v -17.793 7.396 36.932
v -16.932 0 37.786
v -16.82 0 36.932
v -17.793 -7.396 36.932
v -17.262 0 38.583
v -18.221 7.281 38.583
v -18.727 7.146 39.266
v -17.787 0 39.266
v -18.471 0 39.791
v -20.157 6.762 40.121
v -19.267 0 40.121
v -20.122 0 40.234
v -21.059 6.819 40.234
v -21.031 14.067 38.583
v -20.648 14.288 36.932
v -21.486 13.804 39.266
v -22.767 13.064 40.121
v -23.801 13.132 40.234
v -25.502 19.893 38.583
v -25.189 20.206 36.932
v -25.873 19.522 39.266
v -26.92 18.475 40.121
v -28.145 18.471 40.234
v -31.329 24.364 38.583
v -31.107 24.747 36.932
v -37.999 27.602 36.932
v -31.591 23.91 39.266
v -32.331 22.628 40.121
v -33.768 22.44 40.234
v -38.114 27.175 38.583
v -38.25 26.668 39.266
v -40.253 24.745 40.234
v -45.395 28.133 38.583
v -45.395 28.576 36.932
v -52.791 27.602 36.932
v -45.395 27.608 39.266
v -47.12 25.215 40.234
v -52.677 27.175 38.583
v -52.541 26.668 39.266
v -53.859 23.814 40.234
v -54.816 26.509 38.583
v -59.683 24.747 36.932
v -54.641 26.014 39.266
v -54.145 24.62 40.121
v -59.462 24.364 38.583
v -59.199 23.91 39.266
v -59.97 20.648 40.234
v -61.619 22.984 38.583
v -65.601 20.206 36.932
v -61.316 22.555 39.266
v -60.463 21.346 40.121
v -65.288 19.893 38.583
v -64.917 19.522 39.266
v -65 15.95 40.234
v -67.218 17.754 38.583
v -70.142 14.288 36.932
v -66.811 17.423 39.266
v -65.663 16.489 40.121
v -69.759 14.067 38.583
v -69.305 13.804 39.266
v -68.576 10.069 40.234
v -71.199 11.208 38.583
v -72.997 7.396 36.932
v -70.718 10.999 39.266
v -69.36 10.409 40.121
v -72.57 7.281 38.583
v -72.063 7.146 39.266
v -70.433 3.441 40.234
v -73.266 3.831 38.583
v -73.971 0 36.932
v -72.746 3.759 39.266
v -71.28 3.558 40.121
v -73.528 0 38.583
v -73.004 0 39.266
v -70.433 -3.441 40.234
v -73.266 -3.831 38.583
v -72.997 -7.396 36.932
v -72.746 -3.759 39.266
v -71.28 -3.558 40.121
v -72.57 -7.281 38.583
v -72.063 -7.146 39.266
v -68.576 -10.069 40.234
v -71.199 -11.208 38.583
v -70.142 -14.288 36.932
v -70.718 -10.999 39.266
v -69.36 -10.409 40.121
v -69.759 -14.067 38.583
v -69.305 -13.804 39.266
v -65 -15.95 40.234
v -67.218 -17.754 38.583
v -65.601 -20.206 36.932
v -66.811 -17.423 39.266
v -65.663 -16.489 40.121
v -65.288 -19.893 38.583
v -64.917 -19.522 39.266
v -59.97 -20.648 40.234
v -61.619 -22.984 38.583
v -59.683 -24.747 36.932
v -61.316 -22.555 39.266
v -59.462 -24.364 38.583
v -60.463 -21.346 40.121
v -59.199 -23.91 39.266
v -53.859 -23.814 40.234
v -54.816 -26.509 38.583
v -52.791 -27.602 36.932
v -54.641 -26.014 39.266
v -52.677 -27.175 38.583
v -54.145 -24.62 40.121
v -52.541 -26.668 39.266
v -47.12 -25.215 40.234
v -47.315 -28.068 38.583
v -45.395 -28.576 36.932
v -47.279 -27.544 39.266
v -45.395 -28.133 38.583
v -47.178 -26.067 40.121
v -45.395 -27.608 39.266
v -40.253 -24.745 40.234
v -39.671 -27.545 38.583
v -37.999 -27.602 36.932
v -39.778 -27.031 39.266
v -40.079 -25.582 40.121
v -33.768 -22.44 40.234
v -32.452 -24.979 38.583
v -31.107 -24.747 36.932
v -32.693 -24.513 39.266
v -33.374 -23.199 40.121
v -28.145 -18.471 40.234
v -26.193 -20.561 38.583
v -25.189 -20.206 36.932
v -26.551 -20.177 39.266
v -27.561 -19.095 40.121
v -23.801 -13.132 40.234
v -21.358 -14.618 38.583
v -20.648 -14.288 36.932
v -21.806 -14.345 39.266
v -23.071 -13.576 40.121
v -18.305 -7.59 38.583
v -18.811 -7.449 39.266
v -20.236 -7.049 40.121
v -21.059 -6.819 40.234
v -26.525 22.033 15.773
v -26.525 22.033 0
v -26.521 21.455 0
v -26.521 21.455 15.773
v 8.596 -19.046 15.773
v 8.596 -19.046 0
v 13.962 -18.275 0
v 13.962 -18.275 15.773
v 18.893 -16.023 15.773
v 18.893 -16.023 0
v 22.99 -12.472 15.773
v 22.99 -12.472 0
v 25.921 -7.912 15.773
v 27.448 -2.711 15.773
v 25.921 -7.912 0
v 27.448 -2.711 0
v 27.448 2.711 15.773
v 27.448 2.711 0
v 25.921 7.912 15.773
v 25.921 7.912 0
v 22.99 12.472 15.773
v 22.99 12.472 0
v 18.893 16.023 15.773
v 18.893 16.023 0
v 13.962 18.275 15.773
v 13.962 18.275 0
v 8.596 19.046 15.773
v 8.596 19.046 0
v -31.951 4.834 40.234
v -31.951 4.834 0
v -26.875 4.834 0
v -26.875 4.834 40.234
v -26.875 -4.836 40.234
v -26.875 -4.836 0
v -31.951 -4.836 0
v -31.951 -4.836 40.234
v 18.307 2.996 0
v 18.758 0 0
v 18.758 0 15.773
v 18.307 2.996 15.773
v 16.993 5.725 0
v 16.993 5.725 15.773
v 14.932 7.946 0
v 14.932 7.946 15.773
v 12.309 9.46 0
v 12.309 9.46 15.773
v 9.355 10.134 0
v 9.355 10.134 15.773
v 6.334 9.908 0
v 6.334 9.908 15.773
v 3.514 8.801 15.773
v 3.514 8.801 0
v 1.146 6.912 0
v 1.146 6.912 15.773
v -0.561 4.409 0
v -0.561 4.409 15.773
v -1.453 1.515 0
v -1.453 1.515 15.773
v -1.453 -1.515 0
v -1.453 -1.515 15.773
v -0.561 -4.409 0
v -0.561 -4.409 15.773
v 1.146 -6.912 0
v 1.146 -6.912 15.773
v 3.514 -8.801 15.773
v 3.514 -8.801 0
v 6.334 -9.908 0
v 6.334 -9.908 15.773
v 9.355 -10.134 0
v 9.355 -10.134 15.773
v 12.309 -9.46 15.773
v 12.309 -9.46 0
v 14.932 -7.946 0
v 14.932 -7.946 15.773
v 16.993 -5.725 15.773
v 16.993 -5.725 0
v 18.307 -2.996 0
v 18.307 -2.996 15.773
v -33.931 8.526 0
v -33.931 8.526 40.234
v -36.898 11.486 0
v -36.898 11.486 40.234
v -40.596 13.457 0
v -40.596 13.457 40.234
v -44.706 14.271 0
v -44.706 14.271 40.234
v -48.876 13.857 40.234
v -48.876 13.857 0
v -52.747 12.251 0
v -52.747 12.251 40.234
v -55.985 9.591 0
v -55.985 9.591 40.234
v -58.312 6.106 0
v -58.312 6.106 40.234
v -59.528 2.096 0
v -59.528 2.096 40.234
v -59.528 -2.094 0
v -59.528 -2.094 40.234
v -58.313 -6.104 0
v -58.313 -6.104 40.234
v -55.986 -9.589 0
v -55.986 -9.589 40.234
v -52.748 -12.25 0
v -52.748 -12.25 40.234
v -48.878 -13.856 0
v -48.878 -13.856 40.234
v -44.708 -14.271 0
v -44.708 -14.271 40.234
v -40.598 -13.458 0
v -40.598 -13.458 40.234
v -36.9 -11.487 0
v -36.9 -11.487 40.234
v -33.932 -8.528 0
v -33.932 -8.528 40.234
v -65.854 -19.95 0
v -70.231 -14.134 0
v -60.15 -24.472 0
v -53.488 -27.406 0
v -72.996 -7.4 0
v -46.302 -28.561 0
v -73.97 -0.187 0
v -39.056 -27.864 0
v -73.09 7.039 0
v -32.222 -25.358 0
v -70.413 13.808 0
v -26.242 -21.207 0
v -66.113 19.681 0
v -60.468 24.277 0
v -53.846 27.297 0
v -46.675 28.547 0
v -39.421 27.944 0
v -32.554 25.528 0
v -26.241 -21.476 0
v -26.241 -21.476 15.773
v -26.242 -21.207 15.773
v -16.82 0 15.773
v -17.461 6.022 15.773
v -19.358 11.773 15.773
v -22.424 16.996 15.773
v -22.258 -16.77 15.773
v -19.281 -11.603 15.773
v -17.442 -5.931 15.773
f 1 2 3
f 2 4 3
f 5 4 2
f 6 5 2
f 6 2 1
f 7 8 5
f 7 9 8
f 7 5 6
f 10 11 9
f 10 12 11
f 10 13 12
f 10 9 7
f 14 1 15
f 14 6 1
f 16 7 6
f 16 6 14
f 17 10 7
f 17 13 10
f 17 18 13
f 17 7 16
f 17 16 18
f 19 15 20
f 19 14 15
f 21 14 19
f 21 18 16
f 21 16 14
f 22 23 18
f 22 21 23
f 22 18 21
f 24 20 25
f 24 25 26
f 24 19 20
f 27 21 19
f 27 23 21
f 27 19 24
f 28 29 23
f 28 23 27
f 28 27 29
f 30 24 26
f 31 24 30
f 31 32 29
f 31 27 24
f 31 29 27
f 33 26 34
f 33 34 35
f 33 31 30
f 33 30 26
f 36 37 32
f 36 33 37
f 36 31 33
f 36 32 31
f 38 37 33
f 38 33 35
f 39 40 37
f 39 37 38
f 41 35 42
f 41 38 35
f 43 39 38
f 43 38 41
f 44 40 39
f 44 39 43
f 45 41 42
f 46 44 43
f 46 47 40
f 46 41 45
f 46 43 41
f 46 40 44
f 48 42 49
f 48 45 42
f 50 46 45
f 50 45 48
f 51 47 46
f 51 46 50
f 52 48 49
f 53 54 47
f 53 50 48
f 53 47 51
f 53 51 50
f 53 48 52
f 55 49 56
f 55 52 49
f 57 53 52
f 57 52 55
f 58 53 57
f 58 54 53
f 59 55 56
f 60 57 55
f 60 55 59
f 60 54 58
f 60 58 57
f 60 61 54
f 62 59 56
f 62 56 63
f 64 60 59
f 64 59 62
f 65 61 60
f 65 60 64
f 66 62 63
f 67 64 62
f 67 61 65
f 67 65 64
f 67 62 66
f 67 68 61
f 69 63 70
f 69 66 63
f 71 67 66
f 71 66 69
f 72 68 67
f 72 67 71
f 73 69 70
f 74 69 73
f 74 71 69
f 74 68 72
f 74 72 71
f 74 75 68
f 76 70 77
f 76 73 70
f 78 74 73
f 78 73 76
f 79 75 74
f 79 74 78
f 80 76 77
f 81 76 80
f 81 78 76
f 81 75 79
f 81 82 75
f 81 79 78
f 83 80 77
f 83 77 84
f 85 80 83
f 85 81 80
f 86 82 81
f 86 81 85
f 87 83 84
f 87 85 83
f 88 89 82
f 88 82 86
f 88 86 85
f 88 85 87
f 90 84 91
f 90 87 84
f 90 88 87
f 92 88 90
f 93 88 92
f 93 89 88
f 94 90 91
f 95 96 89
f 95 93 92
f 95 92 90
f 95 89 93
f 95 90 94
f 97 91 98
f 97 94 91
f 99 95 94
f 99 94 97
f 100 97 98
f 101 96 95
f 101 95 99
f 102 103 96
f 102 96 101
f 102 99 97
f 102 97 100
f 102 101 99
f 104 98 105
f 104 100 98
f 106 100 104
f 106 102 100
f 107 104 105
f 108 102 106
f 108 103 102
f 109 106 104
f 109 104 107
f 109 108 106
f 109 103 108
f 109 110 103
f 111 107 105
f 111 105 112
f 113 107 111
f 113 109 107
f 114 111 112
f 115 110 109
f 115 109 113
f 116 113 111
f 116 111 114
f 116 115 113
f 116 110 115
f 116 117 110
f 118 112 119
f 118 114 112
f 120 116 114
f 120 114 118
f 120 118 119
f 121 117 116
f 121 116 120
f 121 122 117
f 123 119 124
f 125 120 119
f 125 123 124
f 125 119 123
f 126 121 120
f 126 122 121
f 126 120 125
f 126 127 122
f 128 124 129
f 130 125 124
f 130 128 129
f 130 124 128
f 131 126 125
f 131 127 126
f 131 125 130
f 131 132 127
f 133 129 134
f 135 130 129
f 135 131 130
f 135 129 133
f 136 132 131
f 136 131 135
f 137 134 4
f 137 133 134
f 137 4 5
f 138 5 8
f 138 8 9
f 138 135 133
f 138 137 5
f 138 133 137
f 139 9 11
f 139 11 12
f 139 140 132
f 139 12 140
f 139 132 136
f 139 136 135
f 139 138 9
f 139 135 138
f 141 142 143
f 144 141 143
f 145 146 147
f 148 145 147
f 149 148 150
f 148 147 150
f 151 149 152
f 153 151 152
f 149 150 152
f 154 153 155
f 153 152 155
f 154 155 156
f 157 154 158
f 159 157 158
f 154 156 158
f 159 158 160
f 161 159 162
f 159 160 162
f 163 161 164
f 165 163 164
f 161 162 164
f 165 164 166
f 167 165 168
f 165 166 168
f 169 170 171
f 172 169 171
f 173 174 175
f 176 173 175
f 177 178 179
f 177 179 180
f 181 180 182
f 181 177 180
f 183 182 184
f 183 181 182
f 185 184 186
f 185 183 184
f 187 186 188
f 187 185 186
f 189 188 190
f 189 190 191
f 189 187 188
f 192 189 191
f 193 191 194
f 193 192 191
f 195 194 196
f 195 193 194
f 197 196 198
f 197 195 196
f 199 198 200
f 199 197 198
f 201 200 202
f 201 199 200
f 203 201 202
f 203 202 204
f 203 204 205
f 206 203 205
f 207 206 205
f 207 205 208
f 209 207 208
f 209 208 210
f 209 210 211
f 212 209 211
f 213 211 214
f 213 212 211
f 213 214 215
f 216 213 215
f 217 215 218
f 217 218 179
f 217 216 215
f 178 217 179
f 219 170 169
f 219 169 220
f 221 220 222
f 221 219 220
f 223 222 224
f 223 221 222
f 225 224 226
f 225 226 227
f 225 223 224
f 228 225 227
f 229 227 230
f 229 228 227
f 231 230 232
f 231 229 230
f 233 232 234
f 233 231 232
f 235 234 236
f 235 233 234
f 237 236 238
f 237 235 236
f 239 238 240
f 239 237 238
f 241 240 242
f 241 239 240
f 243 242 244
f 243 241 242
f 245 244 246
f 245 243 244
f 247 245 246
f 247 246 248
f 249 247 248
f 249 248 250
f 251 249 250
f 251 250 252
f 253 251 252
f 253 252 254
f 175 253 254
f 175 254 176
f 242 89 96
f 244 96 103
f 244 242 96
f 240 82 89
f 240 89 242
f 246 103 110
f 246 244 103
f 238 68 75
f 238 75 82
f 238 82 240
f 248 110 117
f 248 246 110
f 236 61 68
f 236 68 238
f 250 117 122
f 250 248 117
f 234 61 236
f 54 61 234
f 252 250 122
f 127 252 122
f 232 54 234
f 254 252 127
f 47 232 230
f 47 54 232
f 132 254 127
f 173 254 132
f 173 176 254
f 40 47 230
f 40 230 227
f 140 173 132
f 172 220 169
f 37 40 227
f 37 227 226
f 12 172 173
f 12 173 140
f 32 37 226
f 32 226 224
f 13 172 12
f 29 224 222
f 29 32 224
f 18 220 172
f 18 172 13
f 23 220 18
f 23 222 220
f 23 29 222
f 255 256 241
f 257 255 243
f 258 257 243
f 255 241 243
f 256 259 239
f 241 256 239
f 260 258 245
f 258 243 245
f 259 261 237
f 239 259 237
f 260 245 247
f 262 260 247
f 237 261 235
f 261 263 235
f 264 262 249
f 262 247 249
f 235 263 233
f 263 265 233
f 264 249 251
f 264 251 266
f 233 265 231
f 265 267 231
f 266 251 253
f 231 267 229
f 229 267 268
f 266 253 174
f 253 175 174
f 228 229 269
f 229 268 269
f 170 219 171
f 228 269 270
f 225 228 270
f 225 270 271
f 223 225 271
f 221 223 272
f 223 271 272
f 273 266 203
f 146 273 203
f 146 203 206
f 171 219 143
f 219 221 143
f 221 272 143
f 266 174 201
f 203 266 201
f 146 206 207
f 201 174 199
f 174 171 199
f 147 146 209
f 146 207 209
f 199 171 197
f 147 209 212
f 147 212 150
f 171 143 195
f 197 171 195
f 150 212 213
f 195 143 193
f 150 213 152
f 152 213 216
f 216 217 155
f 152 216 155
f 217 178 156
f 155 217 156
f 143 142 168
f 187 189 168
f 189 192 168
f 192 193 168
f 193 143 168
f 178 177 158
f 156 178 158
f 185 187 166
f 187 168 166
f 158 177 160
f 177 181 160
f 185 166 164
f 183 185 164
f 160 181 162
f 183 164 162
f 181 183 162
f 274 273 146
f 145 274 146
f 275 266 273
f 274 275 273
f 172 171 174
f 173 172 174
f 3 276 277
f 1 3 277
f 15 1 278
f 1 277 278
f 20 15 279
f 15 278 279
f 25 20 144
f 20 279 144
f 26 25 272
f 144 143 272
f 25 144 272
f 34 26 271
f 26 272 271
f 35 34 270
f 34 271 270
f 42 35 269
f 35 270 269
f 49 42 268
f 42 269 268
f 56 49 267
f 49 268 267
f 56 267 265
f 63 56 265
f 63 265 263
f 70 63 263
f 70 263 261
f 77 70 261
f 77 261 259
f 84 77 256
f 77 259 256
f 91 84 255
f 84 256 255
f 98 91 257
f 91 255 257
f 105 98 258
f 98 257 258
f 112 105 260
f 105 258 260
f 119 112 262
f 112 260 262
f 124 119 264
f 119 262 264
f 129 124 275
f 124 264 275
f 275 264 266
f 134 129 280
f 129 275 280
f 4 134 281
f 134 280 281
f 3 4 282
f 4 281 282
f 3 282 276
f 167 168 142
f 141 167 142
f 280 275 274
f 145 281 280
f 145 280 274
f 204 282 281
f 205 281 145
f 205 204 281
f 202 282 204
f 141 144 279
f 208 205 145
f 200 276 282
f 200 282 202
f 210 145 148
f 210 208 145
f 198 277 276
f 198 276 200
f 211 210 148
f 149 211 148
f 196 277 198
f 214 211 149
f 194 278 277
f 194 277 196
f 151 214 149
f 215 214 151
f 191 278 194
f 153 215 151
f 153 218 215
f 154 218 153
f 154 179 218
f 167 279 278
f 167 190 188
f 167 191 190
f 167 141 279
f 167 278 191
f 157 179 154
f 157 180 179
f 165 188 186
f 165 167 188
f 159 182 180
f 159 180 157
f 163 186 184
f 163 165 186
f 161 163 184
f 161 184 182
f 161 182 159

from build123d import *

# Parameters (mm, degrees)
F0_R     = 28.575532
F1_DEPTH = 40.2336
F2_DEPTH = 40.2336
F3_R     = 3.302
F4_R     = 10.162681
F5_DEPTH = 15.7734


with BuildPart() as f1:
    # F0 (on Top) → F1 (new body)
    with BuildSketch(Plane.XY):
        with Locations((-45.395139, 0)):
            Circle(F0_R)
        with BuildLine():
            Line((-26.875399, 4.833719), (-26.875399, 0))
            Line((-26.875399, 0), (-26.875399, -4.835614))
            Line((-26.875399, -4.835614), (-31.951214, -4.835614))
            ThreePointArc((-31.951214, -4.835614), (-59.682276, 0.001007), (-31.950532, 4.833719))
            Line((-31.950532, 4.833719), (-26.875399, 4.833719))
        make_face(mode=Mode.SUBTRACT)
        with BuildLine():
            Line((-39.865061, 4.833719), (-31.950532, 4.833719))
            ThreePointArc((-31.950532, 4.833719), (-59.682276, 0.001007), (-31.951214, -4.835614))
            Line((-31.951214, -4.835614), (-39.865061, -4.835614))
            Line((-39.865061, -4.835614), (-39.865061, 0))
            Line((-39.865061, 0), (-39.865061, 4.833719))
        make_face()
    extrude(amount=F1_DEPTH)

    # F0 (on Top) → F2 (cut)
    with BuildSketch(Plane.XY):
        with BuildLine():
            Line((-31.108002, 0), (-26.875399, 0))
            Line((-26.875399, 0), (-26.875399, 4.833719))
            Line((-26.875399, 4.833719), (-31.950532, 4.833719))
            ThreePointArc((-31.950532, 4.833719), (-31.320211, 2.453298), (-31.108002, 0))
        make_face()
        with BuildLine():
            Line((-39.865061, 4.833719), (-31.950532, 4.833719))
            ThreePointArc((-31.950532, 4.833719), (-59.682276, 0.001007), (-31.951214, -4.835614))
            Line((-31.951214, -4.835614), (-39.865061, -4.835614))
            Line((-39.865061, -4.835614), (-39.865061, 0))
            Line((-39.865061, 0), (-39.865061, 4.833719))
        make_face()
    extrude(amount=F2_DEPTH, mode=Mode.SUBTRACT)

    # F3
    f3_edges = [f1.edges().sort_by_distance(p)[0] for p in [
        (-73.970671, 0, 40.2336),
    ]]
    fillet(f3_edges, radius=F3_R)

    # F4 (on Top) → F5 (join)
    with BuildSketch(Plane.XY):
        with BuildLine():
            Line((8.595701, 19.046027), (-26.525037, 22.033167))
            Line((-26.525037, 22.033167), (-26.240665, -21.475879))
            Line((-26.240665, -21.475879), (8.595701, -19.046027))
            ThreePointArc((8.595701, -19.046027), (27.641729, 0), (8.595701, 19.046027))
        make_face()
        with Locations((8.595701, 0)):
            Circle(F4_R, mode=Mode.SUBTRACT)
    extrude(amount=F5_DEPTH)


solid = f1.part
